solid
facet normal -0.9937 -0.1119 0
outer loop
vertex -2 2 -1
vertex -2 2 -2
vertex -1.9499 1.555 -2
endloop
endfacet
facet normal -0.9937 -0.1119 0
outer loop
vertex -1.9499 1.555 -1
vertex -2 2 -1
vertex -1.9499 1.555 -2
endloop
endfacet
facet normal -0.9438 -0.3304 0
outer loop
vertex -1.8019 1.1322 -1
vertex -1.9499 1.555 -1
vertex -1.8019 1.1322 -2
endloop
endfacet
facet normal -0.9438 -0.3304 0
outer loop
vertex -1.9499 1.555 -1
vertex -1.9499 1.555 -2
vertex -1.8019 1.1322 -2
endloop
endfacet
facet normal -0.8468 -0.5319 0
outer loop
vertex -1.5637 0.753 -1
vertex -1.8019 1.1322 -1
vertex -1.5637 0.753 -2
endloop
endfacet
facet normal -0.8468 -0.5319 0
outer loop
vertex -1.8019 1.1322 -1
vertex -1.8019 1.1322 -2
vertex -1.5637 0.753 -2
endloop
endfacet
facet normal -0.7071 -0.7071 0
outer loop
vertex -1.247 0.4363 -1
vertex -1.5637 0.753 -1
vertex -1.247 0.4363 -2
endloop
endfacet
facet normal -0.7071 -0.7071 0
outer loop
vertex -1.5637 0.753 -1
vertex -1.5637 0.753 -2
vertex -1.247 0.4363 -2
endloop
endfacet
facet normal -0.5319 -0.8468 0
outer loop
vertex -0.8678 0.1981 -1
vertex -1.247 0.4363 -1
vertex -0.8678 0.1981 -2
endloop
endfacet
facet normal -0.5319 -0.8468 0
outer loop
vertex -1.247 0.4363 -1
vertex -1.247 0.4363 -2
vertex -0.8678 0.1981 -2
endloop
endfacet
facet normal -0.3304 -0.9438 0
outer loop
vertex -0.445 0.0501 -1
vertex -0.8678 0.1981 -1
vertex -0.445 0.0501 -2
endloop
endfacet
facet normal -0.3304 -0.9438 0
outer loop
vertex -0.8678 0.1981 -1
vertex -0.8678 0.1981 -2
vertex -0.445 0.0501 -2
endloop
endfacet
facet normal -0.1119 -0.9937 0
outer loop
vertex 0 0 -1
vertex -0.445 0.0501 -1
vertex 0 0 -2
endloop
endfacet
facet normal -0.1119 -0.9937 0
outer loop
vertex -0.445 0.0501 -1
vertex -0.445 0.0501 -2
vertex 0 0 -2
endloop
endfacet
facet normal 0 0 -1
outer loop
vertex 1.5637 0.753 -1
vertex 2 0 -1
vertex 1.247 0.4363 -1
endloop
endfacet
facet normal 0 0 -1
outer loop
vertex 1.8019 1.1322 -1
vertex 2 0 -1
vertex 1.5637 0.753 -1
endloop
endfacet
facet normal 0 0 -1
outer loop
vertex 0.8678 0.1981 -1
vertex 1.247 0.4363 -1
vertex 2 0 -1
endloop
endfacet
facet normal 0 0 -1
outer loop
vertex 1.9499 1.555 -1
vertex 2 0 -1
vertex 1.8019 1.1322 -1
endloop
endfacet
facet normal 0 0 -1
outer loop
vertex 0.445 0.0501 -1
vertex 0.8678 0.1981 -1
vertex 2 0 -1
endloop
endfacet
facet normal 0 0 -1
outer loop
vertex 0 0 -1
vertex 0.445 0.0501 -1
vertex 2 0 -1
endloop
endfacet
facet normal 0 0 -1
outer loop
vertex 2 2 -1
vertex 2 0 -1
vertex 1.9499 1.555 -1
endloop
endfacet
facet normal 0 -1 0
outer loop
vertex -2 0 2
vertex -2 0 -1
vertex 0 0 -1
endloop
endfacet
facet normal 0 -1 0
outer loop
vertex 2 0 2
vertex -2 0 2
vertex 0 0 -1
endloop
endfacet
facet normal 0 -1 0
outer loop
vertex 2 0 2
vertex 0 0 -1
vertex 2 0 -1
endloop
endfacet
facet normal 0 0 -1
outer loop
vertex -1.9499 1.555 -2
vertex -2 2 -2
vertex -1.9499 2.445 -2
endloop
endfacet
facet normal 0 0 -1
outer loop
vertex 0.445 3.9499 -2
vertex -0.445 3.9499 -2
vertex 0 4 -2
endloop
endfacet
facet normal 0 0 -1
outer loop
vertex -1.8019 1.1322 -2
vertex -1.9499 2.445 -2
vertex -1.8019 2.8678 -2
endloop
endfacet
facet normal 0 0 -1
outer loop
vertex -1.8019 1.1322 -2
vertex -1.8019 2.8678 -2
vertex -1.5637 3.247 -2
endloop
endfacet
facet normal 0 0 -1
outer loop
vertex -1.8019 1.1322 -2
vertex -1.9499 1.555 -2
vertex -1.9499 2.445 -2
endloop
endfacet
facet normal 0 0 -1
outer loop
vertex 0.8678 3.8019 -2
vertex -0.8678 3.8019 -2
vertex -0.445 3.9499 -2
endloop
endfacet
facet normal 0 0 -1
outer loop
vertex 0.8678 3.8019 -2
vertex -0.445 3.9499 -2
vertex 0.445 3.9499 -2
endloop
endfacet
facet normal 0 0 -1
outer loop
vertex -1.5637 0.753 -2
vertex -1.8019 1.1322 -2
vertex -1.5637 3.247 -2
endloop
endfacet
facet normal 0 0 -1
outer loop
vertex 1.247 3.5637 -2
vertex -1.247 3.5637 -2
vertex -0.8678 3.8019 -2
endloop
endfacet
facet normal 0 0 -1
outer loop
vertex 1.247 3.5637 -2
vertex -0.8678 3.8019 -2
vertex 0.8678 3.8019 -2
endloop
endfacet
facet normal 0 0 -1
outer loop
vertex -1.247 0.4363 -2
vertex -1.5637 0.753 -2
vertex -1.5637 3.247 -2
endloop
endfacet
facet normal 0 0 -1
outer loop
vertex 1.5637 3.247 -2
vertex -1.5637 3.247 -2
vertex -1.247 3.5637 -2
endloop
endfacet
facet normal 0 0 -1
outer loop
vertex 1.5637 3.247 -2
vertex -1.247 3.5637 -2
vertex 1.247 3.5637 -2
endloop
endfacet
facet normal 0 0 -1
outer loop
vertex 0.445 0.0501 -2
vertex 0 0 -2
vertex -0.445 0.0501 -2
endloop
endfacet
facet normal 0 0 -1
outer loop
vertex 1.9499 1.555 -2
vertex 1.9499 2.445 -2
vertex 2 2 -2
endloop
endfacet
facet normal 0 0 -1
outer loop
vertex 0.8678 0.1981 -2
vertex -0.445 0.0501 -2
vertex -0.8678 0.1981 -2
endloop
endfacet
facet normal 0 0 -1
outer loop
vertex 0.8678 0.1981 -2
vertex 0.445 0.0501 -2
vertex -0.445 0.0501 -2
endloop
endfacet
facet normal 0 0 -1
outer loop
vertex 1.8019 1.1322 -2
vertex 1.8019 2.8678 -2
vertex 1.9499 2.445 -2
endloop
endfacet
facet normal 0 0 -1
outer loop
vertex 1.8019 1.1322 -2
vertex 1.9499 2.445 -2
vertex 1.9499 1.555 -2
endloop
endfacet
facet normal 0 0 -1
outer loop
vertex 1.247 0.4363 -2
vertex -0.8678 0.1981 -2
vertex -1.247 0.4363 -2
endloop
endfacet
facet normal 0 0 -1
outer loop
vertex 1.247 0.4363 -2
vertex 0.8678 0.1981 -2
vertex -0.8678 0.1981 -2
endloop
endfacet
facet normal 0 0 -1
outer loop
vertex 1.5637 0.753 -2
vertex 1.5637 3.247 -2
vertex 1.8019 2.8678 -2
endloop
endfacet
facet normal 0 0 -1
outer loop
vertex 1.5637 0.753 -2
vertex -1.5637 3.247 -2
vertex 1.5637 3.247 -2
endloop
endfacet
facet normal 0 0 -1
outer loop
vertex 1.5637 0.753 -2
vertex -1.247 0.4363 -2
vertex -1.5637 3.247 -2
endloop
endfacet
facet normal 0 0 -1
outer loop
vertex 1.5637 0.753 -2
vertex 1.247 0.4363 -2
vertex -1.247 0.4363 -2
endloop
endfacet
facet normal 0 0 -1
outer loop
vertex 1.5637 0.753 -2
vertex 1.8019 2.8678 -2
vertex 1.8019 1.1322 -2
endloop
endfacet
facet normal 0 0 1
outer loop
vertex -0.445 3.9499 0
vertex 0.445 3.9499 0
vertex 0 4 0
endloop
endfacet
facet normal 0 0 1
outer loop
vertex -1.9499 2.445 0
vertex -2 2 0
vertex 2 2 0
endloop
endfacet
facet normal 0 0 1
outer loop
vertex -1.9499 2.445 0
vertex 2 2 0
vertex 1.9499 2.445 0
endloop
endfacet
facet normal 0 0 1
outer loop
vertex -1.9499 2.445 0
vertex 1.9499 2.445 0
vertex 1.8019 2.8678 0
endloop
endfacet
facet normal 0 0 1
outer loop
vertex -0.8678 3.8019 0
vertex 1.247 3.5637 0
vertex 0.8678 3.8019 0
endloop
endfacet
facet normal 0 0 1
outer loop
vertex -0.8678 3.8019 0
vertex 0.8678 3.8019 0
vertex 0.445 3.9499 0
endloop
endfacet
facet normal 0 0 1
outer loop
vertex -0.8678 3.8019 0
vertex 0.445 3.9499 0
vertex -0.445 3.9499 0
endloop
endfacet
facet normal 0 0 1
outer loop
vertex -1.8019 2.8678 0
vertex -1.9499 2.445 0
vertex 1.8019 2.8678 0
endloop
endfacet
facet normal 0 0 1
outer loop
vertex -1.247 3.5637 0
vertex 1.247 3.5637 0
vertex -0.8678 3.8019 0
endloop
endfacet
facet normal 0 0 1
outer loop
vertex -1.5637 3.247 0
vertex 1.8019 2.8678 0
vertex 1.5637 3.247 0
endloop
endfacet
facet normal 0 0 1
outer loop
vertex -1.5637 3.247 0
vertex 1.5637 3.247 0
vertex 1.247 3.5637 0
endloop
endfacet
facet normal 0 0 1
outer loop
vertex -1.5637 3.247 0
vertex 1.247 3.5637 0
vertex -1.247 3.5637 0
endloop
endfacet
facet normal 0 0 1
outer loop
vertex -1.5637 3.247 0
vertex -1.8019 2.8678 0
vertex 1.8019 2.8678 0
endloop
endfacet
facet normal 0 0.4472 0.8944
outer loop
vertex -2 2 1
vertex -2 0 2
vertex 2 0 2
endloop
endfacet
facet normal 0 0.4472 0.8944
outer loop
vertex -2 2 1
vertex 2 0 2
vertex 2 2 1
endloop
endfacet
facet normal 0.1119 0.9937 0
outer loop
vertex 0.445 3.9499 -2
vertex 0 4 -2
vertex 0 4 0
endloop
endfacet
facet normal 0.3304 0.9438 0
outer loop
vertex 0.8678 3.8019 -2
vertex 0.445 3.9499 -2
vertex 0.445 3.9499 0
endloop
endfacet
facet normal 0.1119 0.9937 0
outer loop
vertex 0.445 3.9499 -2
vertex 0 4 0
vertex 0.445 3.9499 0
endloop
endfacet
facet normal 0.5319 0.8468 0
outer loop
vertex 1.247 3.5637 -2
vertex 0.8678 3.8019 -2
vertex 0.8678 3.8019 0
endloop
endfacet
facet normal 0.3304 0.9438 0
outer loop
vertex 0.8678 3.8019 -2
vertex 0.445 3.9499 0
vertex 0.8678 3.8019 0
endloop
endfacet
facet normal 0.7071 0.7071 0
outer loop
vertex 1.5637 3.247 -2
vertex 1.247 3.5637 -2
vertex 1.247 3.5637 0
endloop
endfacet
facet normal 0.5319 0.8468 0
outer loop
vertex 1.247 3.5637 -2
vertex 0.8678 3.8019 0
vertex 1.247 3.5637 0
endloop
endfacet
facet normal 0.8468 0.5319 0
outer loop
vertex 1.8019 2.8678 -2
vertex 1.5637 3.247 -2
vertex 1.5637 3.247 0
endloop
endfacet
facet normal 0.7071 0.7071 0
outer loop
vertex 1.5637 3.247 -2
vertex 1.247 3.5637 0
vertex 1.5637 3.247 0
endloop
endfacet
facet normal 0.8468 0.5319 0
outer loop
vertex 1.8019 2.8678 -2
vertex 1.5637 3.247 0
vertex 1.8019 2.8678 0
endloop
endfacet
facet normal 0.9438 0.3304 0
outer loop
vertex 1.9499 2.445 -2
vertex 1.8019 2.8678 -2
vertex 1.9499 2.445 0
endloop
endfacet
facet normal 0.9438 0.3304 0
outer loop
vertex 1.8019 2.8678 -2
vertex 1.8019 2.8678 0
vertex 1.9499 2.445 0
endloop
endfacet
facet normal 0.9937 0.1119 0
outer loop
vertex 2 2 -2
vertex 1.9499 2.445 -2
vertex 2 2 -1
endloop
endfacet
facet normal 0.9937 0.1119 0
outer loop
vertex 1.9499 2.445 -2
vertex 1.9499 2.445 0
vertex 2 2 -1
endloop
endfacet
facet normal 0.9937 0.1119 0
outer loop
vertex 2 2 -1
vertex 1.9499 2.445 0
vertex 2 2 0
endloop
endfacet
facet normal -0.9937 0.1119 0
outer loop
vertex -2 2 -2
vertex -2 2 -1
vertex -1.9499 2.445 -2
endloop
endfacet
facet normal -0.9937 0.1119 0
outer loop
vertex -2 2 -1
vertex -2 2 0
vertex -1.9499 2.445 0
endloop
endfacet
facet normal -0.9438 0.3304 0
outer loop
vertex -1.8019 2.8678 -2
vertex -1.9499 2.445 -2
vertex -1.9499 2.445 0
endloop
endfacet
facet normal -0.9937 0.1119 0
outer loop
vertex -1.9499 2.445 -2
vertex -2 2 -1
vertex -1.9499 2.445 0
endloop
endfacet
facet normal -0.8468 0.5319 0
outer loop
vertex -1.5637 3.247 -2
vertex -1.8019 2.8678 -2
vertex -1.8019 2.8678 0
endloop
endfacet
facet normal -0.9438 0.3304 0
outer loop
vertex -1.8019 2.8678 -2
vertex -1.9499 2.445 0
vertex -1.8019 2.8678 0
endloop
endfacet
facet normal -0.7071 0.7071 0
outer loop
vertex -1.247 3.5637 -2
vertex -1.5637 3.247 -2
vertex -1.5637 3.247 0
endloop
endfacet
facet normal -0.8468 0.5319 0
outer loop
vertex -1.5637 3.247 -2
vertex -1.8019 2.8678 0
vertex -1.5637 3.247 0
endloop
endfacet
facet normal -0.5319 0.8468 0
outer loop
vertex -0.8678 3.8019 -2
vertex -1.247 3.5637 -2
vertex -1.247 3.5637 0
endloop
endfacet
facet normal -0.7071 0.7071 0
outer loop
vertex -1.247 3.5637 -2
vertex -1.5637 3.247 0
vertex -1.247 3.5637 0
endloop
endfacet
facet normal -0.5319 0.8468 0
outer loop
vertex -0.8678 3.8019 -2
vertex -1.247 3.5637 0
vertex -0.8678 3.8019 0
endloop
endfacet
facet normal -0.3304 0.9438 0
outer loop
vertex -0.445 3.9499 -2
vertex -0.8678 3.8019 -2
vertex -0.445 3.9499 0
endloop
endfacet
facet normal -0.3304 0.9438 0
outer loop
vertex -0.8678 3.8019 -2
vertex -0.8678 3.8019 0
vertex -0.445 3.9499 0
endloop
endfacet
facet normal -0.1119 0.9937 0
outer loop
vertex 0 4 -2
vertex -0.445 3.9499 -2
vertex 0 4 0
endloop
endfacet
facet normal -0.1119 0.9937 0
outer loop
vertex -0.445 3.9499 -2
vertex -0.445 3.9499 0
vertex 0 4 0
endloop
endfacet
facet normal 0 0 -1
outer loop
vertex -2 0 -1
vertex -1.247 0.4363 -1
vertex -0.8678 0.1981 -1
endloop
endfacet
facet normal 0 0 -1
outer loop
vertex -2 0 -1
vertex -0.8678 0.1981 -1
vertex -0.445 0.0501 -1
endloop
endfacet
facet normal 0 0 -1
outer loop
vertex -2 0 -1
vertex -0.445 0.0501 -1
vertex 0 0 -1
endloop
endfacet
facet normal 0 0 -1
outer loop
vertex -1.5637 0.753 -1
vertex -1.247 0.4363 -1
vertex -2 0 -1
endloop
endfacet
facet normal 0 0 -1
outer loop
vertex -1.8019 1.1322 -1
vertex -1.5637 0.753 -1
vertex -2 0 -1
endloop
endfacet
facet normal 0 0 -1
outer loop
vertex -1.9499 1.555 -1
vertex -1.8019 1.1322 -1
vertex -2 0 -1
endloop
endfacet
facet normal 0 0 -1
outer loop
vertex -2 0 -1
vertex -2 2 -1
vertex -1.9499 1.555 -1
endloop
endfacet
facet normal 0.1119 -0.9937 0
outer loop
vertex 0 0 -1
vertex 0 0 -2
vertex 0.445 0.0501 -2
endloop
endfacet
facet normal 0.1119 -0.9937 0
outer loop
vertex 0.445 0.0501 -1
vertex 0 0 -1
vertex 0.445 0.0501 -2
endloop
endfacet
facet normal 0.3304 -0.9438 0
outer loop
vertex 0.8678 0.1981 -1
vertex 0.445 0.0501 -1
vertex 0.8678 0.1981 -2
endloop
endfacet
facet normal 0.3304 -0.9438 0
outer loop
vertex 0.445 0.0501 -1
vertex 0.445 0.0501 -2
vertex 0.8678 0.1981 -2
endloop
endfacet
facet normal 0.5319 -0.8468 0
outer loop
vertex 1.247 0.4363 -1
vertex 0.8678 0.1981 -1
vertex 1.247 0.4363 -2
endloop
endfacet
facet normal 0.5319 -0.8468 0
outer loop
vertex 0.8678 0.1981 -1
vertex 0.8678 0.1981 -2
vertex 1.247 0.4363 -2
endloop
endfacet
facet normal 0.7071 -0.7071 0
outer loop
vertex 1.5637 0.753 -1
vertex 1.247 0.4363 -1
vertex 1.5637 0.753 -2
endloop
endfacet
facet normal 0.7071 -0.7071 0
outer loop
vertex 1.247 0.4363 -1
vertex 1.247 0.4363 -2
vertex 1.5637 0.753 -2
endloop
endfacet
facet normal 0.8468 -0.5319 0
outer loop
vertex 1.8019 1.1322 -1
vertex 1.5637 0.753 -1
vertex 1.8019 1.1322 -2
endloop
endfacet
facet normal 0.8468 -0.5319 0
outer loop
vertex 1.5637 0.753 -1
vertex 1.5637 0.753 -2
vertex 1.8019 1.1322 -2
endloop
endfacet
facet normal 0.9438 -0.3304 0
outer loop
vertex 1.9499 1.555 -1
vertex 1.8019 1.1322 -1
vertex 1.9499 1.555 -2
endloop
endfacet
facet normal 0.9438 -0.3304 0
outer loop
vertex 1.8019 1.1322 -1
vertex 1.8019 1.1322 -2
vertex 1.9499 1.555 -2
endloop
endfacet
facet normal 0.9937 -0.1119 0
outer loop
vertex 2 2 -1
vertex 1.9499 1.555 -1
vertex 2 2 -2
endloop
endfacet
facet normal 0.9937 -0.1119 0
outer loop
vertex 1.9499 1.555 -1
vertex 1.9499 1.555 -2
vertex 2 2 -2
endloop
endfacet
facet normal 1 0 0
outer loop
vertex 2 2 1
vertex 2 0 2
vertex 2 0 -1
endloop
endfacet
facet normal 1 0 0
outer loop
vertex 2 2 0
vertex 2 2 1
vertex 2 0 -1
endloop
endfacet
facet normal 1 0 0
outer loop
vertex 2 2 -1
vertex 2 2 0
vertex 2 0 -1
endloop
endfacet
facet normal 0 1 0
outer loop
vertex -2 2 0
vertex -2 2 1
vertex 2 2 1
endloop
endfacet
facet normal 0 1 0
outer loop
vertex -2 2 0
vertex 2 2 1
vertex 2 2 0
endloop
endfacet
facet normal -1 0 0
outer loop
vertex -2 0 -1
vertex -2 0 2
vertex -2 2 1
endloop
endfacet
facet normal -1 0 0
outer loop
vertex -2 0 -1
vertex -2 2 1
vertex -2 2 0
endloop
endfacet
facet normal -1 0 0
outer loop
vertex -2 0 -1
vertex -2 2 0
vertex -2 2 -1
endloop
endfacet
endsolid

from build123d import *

# Parameters (mm, degrees)
SKETCH1_W           = 4
SKETCH1_H           = 4
BOSS_EXTRUDE1_DEPTH = 4
CUT_EXTRUDE1_DEPTH  = 4
CUT_EXTRUDE2_DEPTH  = 4
CUT_EXTRUDE3_DEPTH  = 1


with BuildPart() as part:
    # Sketch1 → Boss-Extrude1 (new body)
    with BuildSketch(Plane(origin=(0, 0, 0), x_dir=(1, 0, 0), z_dir=(0, 1, 0))):
        Rectangle(SKETCH1_W, SKETCH1_H)
    extrude(amount=BOSS_EXTRUDE1_DEPTH)

    # Sketch2 → Cut-Extrude1 (cut)
    with BuildSketch(Plane.XY.offset(2)):
        with BuildLine():
            Line((-2, 4), (-2, 2))
            ThreePointArc((-2, 2), (-1.414213562, 3.414213562), (0, 4))
            Line((0, 4), (-2, 4))
        make_face()
        with BuildLine():
            Line((2, 4), (0, 4))
            ThreePointArc((0, 4), (1.414213562, 3.414213562), (2, 2))
            Line((2, 2), (2, 4))
        make_face()
    extrude(amount=-CUT_EXTRUDE1_DEPTH, mode=Mode.SUBTRACT)

    # Sketch3 → Cut-Extrude2 (cut)
    with BuildSketch(Plane.ZY.offset(2)):
        Polygon((2, 0), (1, 2), (0, 2), (0, 4), (2, 4), align=None)
    extrude(amount=-CUT_EXTRUDE2_DEPTH, mode=Mode.SUBTRACT)

    # Sketch4 → Cut-Extrude3 (cut)
    with BuildSketch(Plane(origin=(0, 0, -2), x_dir=(-1, 0, 0), z_dir=(0, 0, -1))):
        with BuildLine():
            ThreePointArc((0, 0), (-1.414213562, 0.585786438), (-2, 2))
            Line((-2, 2), (-2, 0))
            Line((-2, 0), (0, 0))
        make_face()
        with BuildLine():
            ThreePointArc((2, 2), (1.414213562, 0.585786438), (0, 0))
            Line((0, 0), (2, 0))
            Line((2, 0), (2, 2))
        make_face()
    extrude(amount=-CUT_EXTRUDE3_DEPTH, mode=Mode.SUBTRACT)


solid = part.part
